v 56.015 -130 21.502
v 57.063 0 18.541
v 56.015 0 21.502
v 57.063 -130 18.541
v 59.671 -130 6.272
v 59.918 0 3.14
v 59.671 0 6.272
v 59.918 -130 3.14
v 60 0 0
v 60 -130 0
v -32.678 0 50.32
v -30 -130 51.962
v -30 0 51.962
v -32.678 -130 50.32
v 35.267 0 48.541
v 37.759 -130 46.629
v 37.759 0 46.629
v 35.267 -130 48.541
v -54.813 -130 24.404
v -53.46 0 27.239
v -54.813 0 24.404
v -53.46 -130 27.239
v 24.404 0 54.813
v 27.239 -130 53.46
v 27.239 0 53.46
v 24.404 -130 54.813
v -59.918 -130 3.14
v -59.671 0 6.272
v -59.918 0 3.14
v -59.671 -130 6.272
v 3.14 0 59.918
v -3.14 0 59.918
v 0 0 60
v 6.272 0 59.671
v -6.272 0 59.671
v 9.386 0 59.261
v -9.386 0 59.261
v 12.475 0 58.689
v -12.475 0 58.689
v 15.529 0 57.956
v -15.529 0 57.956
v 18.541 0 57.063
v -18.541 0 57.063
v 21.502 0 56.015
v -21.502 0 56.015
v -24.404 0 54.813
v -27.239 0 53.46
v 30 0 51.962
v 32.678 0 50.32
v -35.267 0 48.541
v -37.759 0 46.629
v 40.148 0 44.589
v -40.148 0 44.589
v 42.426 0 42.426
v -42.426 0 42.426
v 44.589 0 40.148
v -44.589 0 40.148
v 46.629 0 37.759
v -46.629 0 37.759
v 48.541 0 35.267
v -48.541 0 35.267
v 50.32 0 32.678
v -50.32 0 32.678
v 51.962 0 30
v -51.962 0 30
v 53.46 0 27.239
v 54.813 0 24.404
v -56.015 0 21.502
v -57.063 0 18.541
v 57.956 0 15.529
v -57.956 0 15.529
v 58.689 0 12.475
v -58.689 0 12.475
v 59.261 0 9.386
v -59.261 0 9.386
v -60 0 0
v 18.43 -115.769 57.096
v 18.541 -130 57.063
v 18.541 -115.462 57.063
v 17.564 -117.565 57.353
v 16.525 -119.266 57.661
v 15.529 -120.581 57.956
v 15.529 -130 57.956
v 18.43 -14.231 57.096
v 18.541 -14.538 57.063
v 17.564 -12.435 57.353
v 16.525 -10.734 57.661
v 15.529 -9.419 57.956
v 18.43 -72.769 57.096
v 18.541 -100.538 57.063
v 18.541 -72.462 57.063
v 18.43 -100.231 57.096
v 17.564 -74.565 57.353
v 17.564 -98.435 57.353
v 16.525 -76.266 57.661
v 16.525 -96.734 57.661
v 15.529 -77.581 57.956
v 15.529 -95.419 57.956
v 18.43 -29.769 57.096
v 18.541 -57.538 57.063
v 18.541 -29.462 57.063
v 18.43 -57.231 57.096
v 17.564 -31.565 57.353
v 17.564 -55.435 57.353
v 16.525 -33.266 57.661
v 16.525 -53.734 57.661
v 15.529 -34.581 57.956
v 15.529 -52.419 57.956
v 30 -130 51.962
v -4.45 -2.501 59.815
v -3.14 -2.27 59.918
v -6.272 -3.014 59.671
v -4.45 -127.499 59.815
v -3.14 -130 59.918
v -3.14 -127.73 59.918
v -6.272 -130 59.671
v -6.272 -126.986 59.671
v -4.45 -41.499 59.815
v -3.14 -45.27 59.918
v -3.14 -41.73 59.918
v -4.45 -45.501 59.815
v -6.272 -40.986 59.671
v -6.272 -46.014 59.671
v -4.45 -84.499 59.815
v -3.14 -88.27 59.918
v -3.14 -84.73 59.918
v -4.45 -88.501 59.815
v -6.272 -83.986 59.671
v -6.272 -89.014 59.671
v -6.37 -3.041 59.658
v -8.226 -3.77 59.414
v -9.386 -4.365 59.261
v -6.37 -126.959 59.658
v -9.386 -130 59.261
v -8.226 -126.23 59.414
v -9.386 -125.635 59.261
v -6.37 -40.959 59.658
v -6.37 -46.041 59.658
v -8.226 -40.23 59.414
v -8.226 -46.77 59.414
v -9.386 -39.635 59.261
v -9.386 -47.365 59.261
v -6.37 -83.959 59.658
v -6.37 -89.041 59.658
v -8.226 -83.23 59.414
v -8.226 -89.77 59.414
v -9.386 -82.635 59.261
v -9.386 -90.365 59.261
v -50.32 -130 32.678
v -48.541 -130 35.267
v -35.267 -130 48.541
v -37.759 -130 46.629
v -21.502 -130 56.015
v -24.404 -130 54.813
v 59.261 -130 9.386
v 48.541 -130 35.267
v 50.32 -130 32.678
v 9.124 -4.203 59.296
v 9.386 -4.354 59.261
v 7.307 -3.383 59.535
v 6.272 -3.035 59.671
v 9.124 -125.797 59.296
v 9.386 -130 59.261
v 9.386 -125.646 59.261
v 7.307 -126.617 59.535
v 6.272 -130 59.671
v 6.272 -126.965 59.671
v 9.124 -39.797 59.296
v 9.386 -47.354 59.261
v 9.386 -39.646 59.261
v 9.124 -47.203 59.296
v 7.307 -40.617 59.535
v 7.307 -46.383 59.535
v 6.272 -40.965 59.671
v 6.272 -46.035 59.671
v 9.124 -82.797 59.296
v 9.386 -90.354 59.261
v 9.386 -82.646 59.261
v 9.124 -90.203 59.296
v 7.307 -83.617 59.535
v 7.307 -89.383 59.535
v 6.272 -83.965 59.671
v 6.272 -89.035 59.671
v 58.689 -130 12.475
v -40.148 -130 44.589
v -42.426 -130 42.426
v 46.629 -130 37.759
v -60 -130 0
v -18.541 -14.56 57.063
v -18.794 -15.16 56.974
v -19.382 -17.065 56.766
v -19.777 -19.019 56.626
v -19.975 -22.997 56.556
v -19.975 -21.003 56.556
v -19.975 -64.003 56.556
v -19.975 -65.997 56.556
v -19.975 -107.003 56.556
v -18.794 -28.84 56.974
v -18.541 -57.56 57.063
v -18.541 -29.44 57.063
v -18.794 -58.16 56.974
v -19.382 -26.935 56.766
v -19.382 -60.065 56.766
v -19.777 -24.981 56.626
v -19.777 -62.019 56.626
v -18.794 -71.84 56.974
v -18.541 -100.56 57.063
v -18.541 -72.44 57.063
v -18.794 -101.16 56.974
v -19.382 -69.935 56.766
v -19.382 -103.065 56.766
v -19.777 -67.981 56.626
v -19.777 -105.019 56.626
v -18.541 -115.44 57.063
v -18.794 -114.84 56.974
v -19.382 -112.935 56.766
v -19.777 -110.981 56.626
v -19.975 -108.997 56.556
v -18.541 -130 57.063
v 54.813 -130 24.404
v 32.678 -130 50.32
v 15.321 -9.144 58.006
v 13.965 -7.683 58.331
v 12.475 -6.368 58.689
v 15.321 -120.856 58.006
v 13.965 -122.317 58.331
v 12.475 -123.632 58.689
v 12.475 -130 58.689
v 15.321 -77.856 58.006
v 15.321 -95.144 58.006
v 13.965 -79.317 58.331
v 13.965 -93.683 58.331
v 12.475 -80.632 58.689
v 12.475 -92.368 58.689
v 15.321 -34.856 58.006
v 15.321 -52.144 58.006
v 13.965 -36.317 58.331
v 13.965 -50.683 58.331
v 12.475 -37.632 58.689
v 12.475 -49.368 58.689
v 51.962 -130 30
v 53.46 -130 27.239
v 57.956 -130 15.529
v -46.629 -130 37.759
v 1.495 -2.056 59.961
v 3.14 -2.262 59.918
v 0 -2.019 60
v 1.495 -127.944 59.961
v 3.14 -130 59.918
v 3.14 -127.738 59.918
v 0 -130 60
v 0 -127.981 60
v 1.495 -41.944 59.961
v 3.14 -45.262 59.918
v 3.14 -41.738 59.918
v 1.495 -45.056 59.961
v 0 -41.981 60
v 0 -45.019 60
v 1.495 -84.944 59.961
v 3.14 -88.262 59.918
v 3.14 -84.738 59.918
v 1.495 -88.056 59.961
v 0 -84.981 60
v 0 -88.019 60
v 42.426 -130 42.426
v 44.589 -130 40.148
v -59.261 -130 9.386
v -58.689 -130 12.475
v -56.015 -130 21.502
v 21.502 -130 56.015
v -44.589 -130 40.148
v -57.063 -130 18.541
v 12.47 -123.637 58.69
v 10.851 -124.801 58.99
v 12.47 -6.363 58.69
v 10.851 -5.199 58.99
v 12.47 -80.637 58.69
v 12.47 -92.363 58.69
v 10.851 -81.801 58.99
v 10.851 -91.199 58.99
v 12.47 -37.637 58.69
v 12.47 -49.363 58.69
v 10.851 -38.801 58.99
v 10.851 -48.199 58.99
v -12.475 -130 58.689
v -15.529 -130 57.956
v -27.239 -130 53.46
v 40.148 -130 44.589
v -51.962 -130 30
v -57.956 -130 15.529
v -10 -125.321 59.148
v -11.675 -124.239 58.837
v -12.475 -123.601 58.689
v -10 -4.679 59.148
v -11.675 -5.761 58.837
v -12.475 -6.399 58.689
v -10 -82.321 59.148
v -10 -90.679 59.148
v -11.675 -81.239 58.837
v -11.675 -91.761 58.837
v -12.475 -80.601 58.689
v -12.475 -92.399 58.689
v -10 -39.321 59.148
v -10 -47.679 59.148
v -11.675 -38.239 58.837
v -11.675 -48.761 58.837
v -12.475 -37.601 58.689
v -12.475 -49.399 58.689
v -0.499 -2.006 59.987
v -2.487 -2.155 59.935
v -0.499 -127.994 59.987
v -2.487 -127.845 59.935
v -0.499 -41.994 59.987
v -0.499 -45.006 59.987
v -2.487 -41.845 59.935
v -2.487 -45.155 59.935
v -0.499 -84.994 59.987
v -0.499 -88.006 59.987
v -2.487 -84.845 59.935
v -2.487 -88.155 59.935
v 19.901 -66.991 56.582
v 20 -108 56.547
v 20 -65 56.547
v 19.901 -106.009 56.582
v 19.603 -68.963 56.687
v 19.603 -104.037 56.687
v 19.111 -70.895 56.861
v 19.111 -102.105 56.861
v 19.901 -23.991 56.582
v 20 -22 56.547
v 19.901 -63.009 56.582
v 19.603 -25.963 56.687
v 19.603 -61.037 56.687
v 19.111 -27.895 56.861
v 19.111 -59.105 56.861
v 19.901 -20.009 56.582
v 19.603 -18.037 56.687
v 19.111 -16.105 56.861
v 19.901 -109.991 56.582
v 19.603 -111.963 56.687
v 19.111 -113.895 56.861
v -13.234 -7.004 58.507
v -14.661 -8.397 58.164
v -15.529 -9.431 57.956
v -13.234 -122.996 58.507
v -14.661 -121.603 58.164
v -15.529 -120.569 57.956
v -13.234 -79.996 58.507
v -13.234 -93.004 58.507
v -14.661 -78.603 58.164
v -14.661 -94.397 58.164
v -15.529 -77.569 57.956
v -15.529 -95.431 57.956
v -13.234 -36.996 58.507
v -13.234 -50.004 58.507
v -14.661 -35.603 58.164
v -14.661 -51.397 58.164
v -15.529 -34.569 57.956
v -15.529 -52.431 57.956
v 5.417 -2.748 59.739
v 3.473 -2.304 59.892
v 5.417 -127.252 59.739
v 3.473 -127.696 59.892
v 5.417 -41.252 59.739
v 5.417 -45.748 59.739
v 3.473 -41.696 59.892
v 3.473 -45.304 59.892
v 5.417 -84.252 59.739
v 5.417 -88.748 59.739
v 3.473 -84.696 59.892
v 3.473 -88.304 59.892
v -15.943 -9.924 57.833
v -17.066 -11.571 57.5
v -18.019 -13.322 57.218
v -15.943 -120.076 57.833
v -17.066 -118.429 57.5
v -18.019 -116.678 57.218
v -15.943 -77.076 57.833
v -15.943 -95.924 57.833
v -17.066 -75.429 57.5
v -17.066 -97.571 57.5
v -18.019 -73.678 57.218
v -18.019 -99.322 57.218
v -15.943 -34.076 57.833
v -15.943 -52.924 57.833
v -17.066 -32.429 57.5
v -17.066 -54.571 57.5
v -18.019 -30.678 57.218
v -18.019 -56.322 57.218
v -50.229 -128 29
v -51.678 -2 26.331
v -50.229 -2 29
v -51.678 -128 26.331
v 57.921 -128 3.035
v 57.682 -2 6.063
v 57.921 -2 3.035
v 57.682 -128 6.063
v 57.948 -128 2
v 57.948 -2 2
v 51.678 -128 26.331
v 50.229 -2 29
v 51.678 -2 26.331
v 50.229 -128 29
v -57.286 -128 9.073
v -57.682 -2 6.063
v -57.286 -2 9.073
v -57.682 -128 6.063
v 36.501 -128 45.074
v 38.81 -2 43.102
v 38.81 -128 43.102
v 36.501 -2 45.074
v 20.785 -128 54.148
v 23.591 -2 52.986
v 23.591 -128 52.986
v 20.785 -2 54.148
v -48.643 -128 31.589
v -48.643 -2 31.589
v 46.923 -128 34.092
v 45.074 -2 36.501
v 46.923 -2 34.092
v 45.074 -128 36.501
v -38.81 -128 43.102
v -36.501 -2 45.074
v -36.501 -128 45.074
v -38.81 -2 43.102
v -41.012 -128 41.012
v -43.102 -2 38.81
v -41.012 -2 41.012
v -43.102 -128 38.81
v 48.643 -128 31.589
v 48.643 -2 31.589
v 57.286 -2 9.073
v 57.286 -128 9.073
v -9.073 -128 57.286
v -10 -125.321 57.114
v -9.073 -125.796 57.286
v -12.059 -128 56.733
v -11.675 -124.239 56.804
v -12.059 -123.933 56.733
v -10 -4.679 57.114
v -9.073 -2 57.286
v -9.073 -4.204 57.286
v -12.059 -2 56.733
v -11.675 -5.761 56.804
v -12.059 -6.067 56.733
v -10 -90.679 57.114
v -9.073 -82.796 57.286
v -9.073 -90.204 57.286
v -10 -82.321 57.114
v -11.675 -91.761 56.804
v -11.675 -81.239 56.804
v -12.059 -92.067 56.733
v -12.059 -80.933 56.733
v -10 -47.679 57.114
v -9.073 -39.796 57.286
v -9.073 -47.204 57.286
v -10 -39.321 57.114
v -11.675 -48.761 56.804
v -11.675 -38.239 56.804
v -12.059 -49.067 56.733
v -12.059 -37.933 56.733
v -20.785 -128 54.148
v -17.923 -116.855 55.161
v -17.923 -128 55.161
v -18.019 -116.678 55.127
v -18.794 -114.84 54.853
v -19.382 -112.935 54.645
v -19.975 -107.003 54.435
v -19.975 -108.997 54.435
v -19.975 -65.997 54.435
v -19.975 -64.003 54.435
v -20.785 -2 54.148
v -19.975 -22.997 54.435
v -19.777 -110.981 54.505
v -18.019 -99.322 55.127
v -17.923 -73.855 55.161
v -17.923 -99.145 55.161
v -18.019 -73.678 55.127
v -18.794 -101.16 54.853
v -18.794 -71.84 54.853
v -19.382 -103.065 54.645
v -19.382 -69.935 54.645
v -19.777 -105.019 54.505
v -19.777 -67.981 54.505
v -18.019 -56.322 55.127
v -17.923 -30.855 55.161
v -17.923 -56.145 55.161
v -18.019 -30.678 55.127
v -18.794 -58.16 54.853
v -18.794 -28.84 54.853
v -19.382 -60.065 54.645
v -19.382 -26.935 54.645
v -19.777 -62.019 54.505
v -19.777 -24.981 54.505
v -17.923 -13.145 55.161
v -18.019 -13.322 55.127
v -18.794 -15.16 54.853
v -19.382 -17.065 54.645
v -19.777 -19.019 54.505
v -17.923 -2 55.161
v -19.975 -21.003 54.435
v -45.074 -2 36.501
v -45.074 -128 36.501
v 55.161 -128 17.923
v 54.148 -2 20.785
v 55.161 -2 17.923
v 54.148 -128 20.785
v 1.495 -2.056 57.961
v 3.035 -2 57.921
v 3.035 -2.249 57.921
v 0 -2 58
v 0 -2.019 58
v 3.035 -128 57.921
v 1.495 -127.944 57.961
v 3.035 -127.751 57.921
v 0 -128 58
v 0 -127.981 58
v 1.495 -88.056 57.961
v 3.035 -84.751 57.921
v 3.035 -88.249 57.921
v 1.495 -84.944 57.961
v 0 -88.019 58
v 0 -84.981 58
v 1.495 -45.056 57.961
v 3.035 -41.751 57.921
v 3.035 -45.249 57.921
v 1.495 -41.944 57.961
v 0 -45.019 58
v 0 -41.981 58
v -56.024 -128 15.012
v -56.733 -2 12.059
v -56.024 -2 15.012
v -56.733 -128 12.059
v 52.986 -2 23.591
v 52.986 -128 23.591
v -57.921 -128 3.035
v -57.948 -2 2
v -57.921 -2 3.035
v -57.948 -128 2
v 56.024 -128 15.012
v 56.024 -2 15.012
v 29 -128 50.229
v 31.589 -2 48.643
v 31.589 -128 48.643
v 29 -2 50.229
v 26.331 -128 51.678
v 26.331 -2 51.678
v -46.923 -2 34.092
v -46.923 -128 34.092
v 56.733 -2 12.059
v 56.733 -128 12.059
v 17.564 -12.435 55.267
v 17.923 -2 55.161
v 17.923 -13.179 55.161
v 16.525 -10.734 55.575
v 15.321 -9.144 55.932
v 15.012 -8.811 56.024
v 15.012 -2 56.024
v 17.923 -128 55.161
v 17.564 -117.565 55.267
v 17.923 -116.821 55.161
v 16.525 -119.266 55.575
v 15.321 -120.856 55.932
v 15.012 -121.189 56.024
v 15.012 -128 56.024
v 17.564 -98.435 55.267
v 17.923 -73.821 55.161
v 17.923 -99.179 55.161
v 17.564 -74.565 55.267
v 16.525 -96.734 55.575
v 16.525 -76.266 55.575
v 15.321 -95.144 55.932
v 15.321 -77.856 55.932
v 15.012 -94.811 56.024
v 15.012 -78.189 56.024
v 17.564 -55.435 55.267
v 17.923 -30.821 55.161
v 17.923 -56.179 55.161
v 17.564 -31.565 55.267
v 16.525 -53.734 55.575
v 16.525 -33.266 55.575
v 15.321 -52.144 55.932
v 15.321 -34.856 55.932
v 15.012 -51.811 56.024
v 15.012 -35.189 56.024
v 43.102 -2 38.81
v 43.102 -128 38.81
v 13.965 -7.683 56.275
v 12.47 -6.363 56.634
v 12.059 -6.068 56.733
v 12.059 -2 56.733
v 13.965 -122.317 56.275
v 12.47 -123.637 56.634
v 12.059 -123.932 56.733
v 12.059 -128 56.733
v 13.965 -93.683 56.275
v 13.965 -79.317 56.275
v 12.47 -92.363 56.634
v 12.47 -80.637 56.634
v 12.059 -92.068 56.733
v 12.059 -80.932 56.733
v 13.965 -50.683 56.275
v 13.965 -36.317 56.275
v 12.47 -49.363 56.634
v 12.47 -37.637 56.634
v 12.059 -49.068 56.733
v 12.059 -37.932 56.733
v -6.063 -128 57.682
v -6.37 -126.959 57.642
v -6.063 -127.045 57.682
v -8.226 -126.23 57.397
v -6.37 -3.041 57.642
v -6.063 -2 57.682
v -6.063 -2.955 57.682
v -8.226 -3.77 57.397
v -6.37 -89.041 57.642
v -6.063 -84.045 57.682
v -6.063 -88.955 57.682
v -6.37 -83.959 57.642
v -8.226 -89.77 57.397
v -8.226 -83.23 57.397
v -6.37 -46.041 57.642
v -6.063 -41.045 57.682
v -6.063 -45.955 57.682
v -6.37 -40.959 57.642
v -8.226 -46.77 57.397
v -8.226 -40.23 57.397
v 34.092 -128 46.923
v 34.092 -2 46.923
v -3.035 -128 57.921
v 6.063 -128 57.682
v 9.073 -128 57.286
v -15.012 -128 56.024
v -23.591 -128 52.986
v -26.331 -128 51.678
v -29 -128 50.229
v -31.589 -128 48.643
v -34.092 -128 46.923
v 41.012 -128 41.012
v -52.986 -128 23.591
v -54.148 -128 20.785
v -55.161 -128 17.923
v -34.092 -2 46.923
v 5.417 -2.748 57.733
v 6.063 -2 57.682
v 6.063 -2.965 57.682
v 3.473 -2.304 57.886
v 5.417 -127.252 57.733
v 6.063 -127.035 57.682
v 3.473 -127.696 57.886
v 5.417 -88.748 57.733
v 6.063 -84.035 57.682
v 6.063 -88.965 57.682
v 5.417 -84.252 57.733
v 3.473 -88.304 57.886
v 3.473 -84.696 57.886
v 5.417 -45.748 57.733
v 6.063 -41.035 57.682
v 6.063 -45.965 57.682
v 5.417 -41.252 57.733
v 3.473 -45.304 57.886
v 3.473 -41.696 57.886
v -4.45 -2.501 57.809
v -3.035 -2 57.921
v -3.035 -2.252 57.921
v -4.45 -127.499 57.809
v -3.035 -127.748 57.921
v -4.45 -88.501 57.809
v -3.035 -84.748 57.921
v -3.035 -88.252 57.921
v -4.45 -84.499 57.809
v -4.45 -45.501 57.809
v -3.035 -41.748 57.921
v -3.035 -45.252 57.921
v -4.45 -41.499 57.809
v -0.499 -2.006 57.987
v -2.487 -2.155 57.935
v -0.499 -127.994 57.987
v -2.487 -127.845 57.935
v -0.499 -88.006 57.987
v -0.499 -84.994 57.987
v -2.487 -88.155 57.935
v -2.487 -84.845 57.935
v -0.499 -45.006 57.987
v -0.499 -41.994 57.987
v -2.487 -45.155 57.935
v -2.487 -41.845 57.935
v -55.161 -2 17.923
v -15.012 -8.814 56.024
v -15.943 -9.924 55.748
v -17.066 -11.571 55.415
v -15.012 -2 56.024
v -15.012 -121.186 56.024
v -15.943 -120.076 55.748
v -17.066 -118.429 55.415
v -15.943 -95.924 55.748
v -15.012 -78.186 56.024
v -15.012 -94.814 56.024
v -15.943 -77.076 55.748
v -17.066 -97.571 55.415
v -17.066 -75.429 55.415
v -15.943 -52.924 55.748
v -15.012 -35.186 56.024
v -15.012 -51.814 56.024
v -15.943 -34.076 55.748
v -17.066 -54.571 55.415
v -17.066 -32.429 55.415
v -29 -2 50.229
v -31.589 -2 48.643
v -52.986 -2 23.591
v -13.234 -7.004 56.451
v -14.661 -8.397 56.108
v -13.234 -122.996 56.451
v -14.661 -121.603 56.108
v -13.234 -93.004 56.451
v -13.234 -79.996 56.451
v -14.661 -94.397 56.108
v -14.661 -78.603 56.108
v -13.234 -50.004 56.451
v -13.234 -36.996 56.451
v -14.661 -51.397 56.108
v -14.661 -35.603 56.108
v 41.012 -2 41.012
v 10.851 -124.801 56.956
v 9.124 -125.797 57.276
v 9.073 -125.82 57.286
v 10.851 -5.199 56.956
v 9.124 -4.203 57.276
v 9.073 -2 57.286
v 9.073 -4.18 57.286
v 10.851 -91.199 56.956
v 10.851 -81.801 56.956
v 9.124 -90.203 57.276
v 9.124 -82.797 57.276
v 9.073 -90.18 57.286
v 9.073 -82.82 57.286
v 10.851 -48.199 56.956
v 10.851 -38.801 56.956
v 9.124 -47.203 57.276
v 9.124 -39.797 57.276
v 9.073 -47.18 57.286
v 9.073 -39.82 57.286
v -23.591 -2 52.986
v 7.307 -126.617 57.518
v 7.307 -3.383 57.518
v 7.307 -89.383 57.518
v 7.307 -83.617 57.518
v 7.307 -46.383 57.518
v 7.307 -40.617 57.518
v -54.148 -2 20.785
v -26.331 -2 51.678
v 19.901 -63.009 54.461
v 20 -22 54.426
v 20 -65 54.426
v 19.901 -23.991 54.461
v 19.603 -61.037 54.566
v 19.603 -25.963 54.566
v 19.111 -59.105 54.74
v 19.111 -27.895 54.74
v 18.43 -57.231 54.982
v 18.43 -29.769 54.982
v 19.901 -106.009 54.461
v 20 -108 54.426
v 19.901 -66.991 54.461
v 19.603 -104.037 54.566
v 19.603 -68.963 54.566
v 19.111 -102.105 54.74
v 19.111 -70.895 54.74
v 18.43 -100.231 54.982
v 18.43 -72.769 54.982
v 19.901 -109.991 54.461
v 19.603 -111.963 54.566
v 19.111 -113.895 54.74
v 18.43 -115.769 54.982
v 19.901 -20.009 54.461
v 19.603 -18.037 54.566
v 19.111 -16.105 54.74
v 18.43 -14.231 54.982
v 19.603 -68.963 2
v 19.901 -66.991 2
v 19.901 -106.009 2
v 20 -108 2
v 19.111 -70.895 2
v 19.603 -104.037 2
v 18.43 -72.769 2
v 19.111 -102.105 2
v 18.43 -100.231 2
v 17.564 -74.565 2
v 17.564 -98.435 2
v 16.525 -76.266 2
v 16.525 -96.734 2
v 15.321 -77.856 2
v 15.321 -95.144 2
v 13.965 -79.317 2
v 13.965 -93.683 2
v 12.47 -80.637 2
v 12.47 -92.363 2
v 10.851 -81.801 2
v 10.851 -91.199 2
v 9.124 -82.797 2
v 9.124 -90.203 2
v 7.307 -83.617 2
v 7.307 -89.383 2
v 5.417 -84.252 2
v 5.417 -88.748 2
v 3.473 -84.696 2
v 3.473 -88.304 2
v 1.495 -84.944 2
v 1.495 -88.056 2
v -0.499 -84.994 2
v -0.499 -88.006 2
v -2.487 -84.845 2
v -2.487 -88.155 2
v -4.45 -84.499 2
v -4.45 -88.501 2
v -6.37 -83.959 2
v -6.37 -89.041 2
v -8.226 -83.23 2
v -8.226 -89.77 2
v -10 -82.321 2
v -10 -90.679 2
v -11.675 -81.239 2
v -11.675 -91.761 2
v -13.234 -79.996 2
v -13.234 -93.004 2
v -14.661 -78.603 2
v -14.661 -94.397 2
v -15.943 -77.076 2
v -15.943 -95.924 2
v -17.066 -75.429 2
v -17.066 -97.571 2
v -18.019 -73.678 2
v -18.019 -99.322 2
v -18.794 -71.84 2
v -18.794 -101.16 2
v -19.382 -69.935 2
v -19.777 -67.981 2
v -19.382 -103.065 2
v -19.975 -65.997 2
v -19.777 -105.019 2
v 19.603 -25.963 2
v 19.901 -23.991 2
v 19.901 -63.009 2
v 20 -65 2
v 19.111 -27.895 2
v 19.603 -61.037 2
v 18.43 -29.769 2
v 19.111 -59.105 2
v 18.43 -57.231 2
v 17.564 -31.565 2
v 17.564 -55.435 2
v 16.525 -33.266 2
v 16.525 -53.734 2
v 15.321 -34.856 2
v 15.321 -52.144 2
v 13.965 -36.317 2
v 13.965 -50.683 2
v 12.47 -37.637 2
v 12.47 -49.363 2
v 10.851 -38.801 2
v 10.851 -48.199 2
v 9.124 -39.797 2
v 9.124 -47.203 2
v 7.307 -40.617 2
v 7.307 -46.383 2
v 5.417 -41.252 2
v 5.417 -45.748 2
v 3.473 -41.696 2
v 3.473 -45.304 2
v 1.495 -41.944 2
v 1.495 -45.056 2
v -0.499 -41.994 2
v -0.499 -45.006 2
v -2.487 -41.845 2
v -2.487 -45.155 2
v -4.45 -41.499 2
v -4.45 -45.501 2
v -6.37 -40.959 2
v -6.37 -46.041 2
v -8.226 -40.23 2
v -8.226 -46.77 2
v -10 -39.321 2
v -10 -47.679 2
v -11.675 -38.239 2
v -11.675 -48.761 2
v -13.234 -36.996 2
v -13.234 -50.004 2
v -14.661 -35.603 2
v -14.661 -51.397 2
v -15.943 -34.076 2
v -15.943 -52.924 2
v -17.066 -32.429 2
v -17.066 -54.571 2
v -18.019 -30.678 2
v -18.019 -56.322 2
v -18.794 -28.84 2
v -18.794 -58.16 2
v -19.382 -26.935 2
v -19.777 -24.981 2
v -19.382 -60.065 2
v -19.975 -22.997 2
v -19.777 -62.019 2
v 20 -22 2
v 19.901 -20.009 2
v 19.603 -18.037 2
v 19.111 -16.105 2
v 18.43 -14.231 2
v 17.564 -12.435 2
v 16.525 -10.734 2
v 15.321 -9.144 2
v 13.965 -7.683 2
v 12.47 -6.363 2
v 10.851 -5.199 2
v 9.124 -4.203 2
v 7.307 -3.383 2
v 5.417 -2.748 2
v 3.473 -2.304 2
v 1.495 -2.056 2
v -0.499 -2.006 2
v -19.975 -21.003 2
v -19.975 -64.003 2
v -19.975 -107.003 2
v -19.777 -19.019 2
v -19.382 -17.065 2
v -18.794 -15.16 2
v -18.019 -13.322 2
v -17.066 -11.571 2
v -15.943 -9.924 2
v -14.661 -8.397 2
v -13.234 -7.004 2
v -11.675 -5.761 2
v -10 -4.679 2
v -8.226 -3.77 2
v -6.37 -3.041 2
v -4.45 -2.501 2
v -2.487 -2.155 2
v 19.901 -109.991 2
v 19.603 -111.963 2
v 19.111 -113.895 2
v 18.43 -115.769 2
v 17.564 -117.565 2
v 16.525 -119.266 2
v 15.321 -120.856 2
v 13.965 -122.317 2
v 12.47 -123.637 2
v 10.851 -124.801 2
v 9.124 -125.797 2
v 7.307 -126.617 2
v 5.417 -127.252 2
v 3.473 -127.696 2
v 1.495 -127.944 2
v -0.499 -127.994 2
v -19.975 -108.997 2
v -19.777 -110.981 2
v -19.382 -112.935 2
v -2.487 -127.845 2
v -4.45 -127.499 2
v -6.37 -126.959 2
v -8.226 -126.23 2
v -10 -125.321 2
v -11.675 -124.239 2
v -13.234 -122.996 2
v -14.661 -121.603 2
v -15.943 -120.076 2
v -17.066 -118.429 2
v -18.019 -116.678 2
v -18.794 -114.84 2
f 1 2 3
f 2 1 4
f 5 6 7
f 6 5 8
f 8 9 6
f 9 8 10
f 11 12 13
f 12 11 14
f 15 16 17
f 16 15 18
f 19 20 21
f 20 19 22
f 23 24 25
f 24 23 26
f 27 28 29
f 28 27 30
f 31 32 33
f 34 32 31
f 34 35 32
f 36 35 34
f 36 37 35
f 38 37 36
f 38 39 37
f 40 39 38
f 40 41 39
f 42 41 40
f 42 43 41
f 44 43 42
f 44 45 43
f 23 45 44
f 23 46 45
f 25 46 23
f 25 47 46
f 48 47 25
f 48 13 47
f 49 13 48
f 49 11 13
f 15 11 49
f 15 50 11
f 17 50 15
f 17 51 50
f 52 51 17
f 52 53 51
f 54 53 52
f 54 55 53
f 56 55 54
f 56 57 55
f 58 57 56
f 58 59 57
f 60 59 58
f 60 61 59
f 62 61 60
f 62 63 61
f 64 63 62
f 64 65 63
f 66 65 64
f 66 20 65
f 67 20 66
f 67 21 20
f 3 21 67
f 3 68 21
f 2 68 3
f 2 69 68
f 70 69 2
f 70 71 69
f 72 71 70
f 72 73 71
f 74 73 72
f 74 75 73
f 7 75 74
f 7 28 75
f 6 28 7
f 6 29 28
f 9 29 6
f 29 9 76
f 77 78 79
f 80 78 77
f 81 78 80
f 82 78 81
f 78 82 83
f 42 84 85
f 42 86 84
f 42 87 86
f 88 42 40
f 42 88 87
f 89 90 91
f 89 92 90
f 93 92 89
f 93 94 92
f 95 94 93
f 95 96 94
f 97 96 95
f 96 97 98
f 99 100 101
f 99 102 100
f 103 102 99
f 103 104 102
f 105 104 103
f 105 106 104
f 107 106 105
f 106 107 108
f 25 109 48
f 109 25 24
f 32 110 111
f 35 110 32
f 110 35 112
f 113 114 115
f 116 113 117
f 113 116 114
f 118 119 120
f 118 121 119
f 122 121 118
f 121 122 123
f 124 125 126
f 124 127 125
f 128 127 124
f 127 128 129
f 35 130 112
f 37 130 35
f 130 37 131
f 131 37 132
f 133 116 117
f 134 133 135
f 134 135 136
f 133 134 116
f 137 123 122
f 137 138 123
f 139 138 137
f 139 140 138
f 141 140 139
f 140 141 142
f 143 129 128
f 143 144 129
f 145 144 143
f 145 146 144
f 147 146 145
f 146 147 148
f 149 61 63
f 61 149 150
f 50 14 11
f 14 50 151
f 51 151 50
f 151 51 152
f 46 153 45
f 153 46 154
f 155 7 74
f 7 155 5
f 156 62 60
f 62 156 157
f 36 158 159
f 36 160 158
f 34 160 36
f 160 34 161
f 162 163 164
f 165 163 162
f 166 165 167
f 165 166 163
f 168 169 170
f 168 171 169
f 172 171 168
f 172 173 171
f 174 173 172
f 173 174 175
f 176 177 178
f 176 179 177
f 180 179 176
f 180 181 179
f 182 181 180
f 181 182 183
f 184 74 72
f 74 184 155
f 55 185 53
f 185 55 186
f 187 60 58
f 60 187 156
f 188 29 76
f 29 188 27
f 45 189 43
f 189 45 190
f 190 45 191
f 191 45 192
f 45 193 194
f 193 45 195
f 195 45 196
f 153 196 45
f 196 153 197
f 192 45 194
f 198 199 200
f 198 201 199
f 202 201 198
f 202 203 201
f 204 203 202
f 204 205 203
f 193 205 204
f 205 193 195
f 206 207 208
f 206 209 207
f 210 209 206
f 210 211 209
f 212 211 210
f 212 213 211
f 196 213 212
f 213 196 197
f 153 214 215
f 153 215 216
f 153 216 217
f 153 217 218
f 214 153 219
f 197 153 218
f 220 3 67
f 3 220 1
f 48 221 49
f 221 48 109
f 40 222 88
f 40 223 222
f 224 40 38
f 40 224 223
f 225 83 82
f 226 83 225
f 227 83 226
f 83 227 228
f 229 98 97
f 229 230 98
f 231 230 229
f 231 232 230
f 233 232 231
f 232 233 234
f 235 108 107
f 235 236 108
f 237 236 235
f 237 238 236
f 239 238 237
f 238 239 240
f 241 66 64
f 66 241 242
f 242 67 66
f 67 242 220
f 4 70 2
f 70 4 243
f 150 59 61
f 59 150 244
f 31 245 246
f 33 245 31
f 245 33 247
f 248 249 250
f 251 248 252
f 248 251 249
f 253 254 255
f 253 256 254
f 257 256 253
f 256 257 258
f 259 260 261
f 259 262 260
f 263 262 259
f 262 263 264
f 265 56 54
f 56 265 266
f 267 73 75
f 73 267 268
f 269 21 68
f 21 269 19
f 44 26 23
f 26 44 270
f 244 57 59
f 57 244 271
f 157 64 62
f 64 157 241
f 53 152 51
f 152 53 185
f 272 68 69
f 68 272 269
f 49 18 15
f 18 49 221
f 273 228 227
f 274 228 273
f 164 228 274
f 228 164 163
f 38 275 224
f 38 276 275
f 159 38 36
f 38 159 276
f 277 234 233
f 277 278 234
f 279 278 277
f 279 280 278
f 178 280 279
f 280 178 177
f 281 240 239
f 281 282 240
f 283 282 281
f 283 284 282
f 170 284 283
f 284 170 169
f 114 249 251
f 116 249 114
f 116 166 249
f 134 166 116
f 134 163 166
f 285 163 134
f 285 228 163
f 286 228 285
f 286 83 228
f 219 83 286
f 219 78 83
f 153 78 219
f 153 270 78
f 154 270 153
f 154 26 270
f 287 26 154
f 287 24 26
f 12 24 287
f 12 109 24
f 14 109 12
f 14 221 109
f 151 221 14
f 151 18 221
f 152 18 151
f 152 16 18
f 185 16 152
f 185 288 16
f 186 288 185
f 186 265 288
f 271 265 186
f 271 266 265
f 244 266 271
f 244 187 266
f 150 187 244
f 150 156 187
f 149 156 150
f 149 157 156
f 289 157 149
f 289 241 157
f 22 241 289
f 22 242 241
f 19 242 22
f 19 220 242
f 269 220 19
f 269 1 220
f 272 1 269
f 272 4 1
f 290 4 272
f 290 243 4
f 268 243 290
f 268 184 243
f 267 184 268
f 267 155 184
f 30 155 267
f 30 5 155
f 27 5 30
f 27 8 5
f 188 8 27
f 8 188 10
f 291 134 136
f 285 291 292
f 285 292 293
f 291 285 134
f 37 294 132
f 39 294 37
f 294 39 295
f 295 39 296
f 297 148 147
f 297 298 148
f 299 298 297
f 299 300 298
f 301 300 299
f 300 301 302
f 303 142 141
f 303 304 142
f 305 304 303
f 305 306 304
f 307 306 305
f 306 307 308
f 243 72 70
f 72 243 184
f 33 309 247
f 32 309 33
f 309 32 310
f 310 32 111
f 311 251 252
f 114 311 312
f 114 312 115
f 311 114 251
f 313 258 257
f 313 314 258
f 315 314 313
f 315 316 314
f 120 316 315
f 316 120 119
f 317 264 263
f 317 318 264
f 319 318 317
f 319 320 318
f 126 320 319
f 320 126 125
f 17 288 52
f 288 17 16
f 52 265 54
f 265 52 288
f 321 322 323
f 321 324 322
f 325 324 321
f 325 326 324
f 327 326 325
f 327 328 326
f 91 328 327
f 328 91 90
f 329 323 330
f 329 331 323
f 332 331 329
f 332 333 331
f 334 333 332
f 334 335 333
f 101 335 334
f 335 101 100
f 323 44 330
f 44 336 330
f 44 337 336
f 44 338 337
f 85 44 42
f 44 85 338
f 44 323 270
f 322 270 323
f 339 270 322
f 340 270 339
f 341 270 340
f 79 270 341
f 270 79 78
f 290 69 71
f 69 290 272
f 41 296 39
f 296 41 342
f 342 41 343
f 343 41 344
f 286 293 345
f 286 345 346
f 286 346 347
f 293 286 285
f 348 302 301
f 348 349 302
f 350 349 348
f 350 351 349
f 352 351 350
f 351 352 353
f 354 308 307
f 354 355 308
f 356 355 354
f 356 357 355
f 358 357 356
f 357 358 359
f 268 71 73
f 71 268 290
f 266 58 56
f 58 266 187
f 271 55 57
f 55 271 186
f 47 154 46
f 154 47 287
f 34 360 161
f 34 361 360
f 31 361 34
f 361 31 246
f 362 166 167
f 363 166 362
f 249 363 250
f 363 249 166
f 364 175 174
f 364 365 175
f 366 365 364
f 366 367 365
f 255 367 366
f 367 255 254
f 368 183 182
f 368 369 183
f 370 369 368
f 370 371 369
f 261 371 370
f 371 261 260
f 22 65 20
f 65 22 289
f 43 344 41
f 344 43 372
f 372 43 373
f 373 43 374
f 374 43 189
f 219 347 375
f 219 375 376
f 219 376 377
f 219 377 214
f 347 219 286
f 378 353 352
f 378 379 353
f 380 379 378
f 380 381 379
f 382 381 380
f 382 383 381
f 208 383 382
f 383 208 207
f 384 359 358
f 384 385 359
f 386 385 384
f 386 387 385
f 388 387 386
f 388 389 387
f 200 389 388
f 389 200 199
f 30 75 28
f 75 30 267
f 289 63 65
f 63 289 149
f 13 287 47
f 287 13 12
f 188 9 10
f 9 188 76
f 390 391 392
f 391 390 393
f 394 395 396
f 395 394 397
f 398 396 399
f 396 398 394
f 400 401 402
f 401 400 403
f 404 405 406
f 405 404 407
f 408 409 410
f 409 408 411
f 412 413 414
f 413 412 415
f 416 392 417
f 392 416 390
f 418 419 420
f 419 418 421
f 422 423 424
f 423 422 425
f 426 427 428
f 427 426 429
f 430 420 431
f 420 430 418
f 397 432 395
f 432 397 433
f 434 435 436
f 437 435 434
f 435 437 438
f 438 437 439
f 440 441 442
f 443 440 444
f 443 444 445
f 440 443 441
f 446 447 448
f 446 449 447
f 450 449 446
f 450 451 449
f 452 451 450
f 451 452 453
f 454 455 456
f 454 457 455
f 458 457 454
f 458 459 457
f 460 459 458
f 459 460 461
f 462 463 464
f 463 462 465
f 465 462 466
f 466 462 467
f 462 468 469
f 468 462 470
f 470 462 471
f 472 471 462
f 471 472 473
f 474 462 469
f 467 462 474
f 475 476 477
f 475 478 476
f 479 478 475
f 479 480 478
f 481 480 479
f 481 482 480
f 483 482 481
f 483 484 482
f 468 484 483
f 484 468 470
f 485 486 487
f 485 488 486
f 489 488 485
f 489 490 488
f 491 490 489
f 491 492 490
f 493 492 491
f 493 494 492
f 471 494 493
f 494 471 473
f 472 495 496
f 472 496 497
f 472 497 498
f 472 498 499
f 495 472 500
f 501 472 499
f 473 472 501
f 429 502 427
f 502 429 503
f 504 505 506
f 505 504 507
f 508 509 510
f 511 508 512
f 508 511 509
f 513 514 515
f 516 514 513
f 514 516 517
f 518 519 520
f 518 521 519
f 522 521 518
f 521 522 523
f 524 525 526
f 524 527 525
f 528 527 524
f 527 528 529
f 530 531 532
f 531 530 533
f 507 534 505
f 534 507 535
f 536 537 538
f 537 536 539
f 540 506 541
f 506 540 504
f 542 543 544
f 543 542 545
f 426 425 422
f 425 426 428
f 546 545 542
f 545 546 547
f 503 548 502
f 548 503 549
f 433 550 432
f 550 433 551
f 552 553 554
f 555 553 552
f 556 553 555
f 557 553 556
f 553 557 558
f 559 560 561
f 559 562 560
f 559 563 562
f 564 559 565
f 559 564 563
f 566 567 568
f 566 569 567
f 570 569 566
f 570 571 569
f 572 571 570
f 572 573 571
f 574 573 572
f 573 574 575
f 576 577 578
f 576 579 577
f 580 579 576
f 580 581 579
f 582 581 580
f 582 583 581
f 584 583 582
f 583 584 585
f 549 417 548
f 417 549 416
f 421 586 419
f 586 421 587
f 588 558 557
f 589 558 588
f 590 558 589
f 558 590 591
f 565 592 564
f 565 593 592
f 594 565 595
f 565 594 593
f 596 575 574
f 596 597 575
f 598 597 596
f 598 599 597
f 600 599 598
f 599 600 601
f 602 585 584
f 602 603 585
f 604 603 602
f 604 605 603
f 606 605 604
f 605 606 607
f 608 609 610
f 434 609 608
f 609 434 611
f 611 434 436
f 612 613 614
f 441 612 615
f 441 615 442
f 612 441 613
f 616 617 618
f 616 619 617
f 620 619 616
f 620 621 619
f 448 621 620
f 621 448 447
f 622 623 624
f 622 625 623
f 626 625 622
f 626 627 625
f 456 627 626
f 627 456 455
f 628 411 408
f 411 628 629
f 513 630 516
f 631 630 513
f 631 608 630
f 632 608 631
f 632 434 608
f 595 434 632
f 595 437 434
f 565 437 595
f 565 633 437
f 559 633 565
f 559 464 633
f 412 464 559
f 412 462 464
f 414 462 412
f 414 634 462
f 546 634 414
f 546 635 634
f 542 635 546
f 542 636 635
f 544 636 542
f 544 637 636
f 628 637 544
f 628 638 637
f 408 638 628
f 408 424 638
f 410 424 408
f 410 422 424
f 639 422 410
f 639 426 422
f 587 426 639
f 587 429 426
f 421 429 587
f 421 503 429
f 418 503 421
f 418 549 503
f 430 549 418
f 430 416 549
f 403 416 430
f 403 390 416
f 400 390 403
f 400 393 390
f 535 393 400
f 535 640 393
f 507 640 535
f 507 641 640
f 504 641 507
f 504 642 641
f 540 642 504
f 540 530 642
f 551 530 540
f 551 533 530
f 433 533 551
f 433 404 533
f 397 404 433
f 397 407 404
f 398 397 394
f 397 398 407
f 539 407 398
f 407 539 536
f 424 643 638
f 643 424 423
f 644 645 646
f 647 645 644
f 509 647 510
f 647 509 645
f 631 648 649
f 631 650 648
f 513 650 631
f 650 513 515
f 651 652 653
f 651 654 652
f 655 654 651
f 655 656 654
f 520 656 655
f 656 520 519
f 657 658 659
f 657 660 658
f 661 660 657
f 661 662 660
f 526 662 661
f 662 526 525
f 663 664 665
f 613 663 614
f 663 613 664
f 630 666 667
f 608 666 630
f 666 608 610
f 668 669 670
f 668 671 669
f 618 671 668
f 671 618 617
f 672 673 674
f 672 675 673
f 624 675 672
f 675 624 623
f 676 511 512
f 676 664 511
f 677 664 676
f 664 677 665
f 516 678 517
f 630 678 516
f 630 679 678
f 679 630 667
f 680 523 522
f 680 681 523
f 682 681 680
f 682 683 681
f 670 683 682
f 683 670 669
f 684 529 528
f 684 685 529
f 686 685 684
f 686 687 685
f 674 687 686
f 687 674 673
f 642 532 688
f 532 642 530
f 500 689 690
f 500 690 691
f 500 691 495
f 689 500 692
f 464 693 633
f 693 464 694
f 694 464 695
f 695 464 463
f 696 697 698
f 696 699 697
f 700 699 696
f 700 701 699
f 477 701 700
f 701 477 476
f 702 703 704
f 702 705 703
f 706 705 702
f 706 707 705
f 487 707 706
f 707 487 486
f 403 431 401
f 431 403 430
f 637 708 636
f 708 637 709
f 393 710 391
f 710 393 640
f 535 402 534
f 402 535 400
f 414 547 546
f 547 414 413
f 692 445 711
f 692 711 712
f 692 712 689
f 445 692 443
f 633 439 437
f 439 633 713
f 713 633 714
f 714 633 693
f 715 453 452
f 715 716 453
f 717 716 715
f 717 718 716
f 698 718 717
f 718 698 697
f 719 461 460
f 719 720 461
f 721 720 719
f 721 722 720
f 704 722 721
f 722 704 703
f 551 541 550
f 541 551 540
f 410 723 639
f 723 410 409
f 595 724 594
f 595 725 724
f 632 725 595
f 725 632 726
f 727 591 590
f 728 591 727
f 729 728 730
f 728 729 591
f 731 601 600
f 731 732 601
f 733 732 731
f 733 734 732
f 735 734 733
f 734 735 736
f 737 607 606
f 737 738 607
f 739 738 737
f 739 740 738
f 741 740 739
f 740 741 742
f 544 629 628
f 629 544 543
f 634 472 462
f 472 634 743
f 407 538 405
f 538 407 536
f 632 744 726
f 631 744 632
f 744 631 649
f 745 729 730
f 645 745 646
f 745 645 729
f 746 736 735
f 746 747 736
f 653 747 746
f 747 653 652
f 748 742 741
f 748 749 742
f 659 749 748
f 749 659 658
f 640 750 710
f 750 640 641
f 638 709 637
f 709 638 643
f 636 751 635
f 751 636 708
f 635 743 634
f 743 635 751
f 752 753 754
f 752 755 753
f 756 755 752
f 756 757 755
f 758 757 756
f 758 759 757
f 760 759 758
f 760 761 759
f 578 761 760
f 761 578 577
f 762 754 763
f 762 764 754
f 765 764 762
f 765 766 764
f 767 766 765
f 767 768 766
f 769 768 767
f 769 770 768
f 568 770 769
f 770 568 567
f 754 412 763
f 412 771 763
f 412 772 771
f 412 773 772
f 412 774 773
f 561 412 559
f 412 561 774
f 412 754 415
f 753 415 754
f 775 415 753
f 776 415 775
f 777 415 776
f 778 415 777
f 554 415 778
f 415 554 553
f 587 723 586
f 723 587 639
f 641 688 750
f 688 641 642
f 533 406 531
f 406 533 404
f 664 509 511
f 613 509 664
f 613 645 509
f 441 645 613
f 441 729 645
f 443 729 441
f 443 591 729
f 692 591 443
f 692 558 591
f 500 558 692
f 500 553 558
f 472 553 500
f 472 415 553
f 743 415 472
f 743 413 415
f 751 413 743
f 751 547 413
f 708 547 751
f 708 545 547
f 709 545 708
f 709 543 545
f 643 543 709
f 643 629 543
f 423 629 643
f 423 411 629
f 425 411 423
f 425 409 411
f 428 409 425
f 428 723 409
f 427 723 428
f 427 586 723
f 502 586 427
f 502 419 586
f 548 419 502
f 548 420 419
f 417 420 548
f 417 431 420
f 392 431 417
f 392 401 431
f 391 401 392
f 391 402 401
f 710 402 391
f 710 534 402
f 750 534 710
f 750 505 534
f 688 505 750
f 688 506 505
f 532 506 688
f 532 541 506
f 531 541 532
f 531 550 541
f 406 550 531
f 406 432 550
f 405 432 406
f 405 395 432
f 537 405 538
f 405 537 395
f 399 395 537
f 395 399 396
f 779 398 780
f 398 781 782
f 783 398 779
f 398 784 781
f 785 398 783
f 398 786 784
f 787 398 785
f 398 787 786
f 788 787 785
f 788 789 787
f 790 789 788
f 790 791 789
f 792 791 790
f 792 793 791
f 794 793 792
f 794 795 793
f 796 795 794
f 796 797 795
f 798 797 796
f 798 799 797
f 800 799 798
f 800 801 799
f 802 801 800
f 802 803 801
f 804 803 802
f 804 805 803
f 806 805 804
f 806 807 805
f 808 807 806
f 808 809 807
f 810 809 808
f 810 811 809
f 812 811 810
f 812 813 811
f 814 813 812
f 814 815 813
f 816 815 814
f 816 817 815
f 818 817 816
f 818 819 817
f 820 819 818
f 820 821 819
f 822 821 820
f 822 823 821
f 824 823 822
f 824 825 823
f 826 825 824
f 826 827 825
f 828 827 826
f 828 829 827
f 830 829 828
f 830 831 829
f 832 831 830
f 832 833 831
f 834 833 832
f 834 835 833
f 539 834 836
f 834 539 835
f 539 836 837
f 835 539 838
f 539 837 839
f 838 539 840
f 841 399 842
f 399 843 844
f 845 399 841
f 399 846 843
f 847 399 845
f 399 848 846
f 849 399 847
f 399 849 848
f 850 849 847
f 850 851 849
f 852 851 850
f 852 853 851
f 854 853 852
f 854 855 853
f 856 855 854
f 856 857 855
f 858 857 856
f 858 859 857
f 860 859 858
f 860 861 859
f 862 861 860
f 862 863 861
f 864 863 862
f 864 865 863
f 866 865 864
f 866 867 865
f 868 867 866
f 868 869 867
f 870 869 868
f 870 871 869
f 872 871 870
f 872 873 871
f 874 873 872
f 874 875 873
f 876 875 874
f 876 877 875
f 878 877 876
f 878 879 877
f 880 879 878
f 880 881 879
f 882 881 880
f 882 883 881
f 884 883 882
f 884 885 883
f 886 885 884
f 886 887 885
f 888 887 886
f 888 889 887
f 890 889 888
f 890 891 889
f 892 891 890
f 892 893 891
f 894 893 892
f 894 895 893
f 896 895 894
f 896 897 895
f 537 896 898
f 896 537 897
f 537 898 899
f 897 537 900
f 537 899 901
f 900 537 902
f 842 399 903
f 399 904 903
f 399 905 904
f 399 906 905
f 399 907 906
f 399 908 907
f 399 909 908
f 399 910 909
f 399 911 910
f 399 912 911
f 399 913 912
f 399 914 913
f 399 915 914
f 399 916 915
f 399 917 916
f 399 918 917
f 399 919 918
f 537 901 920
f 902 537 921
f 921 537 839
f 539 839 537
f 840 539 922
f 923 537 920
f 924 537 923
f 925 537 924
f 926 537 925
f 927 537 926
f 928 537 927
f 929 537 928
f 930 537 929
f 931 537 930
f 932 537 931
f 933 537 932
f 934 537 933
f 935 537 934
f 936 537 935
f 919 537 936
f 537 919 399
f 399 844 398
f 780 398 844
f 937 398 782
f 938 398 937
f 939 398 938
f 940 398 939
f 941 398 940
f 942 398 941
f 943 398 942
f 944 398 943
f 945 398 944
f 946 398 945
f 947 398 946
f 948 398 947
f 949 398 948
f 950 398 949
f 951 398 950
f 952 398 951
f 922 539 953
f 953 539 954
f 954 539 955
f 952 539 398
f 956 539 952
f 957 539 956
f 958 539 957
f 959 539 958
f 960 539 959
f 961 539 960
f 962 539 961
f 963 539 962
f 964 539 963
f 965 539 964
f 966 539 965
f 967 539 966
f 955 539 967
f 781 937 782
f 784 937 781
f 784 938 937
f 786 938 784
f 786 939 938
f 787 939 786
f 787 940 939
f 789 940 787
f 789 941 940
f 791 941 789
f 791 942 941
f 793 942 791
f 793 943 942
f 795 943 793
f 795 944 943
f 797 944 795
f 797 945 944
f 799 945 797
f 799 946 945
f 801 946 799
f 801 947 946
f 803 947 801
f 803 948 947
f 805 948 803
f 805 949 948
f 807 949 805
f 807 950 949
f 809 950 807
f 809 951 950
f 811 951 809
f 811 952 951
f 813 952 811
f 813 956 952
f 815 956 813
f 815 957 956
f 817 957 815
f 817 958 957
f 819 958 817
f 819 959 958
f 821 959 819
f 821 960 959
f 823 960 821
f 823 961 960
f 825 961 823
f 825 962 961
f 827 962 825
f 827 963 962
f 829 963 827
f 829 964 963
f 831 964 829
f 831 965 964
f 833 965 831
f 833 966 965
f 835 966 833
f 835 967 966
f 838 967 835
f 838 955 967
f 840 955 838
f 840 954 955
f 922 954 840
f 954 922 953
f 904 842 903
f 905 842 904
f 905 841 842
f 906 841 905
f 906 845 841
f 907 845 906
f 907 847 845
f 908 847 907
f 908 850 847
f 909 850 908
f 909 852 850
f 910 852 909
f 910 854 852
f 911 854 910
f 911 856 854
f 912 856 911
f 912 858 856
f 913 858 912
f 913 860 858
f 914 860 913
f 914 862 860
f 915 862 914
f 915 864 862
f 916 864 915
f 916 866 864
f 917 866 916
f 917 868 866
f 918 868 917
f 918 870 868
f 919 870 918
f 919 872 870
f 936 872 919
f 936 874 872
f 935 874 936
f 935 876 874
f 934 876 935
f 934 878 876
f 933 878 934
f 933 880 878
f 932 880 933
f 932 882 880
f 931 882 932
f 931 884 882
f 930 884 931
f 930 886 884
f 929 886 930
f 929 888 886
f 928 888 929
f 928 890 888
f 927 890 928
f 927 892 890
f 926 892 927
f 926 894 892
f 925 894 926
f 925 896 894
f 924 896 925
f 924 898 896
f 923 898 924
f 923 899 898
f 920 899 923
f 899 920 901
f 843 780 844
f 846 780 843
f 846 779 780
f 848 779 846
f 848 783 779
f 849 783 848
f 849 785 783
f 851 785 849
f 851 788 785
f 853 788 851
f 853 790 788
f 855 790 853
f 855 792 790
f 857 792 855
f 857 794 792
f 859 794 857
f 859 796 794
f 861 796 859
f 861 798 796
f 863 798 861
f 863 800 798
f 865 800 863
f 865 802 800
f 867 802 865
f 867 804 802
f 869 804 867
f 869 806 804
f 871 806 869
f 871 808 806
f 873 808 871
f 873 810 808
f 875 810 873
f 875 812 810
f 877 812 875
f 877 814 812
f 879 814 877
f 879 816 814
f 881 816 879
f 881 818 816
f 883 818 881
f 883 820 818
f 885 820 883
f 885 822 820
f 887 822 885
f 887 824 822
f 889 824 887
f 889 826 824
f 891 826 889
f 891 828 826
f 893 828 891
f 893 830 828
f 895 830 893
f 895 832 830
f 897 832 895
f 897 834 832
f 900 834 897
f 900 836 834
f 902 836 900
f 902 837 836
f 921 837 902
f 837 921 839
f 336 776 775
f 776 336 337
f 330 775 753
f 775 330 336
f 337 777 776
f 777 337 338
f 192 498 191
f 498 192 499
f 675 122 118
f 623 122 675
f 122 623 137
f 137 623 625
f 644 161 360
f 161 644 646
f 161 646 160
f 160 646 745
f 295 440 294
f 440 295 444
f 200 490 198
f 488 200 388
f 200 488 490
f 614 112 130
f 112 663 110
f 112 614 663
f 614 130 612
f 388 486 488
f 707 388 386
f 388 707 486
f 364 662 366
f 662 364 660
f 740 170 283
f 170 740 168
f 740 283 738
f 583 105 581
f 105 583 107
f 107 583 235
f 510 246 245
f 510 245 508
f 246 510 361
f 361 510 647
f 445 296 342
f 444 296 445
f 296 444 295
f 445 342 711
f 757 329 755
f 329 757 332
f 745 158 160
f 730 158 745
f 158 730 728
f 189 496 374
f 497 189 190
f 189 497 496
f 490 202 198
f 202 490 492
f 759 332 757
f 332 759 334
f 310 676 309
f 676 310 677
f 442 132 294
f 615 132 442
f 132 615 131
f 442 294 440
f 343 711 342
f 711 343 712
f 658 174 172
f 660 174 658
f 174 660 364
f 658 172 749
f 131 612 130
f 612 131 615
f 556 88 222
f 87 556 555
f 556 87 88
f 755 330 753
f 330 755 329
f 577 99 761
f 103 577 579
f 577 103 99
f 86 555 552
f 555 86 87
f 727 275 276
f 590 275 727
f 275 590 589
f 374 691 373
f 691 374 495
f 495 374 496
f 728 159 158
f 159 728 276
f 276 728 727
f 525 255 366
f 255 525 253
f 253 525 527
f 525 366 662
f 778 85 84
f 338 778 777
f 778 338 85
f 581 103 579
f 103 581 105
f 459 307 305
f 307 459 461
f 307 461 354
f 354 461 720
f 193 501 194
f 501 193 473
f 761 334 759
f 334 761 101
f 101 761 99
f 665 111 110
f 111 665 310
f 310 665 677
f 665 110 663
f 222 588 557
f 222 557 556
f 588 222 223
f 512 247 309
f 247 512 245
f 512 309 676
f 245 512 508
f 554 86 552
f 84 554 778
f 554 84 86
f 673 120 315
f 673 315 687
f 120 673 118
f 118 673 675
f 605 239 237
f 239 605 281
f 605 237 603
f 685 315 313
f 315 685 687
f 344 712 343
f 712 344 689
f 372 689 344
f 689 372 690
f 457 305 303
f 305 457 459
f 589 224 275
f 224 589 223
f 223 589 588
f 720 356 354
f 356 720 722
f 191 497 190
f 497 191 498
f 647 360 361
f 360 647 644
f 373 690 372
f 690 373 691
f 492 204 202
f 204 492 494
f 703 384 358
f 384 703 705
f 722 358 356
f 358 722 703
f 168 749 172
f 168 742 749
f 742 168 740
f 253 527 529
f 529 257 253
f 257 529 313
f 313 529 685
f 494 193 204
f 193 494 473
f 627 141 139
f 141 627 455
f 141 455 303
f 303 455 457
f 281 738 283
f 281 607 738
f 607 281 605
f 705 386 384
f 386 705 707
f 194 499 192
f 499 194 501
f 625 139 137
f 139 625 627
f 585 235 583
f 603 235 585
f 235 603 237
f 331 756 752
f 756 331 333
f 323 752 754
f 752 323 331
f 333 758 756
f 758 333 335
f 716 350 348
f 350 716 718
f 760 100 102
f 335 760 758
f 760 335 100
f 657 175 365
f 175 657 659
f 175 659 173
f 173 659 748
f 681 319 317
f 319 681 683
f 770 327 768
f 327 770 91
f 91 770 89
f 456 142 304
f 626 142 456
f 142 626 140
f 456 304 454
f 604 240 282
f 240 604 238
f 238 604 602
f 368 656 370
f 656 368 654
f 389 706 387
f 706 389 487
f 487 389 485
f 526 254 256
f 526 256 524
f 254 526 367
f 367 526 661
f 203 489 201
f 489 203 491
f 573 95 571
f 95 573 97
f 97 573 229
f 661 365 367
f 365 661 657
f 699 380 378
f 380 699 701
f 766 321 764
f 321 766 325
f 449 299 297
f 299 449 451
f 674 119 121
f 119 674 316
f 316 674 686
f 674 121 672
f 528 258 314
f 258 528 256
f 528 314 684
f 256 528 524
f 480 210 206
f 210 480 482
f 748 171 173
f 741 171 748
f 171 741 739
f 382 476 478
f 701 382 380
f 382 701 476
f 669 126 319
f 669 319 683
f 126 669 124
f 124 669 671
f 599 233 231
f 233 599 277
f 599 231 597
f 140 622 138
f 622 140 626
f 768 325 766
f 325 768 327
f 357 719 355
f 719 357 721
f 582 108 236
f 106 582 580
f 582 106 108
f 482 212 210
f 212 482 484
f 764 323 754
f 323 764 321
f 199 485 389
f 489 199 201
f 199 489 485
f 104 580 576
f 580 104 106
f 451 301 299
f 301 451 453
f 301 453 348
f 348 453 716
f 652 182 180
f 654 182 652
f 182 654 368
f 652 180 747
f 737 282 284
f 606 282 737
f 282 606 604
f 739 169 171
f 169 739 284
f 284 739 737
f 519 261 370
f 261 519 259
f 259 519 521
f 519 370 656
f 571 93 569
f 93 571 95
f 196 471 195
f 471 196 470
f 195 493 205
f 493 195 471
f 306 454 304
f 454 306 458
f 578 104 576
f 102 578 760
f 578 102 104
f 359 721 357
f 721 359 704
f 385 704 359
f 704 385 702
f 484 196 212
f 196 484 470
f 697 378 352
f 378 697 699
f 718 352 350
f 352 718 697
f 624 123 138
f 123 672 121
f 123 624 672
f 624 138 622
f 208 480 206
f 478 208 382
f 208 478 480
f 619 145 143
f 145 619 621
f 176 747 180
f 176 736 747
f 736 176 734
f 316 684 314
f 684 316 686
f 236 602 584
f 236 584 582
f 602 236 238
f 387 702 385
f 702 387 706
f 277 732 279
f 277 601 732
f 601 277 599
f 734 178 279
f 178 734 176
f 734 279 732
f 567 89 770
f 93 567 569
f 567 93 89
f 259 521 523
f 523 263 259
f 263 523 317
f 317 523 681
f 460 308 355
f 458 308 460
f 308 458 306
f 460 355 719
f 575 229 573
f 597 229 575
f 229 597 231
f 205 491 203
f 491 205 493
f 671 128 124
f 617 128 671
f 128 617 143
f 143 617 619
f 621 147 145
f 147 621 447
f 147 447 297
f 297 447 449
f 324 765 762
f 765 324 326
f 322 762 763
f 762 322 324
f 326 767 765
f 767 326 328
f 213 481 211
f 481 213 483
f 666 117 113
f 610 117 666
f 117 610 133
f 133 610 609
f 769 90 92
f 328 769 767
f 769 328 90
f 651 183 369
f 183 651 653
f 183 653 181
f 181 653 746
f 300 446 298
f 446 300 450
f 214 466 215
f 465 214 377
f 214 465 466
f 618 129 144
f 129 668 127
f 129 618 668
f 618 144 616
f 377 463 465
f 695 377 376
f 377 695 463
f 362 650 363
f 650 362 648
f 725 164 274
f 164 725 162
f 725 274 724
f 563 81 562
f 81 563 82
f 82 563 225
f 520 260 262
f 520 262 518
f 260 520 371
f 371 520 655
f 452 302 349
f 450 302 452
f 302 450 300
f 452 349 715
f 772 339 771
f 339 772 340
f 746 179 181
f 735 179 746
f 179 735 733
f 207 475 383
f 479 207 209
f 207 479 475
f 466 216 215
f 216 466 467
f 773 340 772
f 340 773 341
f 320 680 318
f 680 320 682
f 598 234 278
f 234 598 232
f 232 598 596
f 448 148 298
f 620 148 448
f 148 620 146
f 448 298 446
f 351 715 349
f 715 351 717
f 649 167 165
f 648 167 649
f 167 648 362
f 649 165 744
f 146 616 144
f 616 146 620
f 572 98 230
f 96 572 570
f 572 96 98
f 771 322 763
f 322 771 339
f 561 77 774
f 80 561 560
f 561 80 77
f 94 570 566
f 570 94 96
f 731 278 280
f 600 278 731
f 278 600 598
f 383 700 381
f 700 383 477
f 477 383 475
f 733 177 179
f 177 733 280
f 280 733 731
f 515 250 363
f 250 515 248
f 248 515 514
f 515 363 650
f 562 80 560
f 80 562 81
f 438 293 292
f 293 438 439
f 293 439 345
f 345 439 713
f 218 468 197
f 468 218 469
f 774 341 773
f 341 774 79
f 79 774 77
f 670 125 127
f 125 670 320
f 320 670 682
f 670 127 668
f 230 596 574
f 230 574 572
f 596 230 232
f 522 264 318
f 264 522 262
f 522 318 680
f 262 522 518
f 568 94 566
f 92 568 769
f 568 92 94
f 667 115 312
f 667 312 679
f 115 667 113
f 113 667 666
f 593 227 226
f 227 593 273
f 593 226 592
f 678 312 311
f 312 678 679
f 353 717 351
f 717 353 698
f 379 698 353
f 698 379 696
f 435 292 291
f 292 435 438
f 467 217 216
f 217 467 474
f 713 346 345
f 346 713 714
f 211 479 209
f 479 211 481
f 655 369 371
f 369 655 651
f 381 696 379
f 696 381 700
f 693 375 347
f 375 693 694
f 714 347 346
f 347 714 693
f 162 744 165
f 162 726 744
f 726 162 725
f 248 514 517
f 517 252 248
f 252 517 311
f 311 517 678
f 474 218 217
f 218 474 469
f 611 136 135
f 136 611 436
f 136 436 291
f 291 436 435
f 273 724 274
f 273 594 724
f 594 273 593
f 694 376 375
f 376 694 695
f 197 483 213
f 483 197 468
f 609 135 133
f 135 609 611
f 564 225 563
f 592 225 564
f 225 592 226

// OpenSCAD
cylinder_length = 130;
cylinder_radius = 60;
wall_strength = 2;
fa_cylinder = 3;


hole_radius = 20;
num_holes = 3;
fa_holes = 3;



difference() {
difference() {
difference() {
translate([0,0,0])rotate([90,0,0])cylinder(cylinder_length,cylinder_radius,cylinder_radius,$fa=fa_cylinder);
translate([-cylinder_radius,-cylinder_length,-cylinder_radius])cube([cylinder_radius*2,cylinder_length,cylinder_radius]);
}

difference() {
translate([0,-wall_strength,0])rotate([90,0,0])cylinder(cylinder_length-2*wall_strength,cylinder_radius-wall_strength,cylinder_radius-wall_strength,$fa=fa_cylinder);
translate([-cylinder_radius,-cylinder_length,-cylinder_radius+wall_strength])cube([cylinder_radius*2,cylinder_length,cylinder_radius]);
}
}

hi = (cylinder_length-wall_strength*2-hole_radius*2) / (num_holes-1);
for(h = [0:num_holes-1]) {
    translate([0,-hole_radius-wall_strength-h*hi,wall_strength]) cylinder(1000,hole_radius,hole_radius,$fa=fa_holes);
}
}
